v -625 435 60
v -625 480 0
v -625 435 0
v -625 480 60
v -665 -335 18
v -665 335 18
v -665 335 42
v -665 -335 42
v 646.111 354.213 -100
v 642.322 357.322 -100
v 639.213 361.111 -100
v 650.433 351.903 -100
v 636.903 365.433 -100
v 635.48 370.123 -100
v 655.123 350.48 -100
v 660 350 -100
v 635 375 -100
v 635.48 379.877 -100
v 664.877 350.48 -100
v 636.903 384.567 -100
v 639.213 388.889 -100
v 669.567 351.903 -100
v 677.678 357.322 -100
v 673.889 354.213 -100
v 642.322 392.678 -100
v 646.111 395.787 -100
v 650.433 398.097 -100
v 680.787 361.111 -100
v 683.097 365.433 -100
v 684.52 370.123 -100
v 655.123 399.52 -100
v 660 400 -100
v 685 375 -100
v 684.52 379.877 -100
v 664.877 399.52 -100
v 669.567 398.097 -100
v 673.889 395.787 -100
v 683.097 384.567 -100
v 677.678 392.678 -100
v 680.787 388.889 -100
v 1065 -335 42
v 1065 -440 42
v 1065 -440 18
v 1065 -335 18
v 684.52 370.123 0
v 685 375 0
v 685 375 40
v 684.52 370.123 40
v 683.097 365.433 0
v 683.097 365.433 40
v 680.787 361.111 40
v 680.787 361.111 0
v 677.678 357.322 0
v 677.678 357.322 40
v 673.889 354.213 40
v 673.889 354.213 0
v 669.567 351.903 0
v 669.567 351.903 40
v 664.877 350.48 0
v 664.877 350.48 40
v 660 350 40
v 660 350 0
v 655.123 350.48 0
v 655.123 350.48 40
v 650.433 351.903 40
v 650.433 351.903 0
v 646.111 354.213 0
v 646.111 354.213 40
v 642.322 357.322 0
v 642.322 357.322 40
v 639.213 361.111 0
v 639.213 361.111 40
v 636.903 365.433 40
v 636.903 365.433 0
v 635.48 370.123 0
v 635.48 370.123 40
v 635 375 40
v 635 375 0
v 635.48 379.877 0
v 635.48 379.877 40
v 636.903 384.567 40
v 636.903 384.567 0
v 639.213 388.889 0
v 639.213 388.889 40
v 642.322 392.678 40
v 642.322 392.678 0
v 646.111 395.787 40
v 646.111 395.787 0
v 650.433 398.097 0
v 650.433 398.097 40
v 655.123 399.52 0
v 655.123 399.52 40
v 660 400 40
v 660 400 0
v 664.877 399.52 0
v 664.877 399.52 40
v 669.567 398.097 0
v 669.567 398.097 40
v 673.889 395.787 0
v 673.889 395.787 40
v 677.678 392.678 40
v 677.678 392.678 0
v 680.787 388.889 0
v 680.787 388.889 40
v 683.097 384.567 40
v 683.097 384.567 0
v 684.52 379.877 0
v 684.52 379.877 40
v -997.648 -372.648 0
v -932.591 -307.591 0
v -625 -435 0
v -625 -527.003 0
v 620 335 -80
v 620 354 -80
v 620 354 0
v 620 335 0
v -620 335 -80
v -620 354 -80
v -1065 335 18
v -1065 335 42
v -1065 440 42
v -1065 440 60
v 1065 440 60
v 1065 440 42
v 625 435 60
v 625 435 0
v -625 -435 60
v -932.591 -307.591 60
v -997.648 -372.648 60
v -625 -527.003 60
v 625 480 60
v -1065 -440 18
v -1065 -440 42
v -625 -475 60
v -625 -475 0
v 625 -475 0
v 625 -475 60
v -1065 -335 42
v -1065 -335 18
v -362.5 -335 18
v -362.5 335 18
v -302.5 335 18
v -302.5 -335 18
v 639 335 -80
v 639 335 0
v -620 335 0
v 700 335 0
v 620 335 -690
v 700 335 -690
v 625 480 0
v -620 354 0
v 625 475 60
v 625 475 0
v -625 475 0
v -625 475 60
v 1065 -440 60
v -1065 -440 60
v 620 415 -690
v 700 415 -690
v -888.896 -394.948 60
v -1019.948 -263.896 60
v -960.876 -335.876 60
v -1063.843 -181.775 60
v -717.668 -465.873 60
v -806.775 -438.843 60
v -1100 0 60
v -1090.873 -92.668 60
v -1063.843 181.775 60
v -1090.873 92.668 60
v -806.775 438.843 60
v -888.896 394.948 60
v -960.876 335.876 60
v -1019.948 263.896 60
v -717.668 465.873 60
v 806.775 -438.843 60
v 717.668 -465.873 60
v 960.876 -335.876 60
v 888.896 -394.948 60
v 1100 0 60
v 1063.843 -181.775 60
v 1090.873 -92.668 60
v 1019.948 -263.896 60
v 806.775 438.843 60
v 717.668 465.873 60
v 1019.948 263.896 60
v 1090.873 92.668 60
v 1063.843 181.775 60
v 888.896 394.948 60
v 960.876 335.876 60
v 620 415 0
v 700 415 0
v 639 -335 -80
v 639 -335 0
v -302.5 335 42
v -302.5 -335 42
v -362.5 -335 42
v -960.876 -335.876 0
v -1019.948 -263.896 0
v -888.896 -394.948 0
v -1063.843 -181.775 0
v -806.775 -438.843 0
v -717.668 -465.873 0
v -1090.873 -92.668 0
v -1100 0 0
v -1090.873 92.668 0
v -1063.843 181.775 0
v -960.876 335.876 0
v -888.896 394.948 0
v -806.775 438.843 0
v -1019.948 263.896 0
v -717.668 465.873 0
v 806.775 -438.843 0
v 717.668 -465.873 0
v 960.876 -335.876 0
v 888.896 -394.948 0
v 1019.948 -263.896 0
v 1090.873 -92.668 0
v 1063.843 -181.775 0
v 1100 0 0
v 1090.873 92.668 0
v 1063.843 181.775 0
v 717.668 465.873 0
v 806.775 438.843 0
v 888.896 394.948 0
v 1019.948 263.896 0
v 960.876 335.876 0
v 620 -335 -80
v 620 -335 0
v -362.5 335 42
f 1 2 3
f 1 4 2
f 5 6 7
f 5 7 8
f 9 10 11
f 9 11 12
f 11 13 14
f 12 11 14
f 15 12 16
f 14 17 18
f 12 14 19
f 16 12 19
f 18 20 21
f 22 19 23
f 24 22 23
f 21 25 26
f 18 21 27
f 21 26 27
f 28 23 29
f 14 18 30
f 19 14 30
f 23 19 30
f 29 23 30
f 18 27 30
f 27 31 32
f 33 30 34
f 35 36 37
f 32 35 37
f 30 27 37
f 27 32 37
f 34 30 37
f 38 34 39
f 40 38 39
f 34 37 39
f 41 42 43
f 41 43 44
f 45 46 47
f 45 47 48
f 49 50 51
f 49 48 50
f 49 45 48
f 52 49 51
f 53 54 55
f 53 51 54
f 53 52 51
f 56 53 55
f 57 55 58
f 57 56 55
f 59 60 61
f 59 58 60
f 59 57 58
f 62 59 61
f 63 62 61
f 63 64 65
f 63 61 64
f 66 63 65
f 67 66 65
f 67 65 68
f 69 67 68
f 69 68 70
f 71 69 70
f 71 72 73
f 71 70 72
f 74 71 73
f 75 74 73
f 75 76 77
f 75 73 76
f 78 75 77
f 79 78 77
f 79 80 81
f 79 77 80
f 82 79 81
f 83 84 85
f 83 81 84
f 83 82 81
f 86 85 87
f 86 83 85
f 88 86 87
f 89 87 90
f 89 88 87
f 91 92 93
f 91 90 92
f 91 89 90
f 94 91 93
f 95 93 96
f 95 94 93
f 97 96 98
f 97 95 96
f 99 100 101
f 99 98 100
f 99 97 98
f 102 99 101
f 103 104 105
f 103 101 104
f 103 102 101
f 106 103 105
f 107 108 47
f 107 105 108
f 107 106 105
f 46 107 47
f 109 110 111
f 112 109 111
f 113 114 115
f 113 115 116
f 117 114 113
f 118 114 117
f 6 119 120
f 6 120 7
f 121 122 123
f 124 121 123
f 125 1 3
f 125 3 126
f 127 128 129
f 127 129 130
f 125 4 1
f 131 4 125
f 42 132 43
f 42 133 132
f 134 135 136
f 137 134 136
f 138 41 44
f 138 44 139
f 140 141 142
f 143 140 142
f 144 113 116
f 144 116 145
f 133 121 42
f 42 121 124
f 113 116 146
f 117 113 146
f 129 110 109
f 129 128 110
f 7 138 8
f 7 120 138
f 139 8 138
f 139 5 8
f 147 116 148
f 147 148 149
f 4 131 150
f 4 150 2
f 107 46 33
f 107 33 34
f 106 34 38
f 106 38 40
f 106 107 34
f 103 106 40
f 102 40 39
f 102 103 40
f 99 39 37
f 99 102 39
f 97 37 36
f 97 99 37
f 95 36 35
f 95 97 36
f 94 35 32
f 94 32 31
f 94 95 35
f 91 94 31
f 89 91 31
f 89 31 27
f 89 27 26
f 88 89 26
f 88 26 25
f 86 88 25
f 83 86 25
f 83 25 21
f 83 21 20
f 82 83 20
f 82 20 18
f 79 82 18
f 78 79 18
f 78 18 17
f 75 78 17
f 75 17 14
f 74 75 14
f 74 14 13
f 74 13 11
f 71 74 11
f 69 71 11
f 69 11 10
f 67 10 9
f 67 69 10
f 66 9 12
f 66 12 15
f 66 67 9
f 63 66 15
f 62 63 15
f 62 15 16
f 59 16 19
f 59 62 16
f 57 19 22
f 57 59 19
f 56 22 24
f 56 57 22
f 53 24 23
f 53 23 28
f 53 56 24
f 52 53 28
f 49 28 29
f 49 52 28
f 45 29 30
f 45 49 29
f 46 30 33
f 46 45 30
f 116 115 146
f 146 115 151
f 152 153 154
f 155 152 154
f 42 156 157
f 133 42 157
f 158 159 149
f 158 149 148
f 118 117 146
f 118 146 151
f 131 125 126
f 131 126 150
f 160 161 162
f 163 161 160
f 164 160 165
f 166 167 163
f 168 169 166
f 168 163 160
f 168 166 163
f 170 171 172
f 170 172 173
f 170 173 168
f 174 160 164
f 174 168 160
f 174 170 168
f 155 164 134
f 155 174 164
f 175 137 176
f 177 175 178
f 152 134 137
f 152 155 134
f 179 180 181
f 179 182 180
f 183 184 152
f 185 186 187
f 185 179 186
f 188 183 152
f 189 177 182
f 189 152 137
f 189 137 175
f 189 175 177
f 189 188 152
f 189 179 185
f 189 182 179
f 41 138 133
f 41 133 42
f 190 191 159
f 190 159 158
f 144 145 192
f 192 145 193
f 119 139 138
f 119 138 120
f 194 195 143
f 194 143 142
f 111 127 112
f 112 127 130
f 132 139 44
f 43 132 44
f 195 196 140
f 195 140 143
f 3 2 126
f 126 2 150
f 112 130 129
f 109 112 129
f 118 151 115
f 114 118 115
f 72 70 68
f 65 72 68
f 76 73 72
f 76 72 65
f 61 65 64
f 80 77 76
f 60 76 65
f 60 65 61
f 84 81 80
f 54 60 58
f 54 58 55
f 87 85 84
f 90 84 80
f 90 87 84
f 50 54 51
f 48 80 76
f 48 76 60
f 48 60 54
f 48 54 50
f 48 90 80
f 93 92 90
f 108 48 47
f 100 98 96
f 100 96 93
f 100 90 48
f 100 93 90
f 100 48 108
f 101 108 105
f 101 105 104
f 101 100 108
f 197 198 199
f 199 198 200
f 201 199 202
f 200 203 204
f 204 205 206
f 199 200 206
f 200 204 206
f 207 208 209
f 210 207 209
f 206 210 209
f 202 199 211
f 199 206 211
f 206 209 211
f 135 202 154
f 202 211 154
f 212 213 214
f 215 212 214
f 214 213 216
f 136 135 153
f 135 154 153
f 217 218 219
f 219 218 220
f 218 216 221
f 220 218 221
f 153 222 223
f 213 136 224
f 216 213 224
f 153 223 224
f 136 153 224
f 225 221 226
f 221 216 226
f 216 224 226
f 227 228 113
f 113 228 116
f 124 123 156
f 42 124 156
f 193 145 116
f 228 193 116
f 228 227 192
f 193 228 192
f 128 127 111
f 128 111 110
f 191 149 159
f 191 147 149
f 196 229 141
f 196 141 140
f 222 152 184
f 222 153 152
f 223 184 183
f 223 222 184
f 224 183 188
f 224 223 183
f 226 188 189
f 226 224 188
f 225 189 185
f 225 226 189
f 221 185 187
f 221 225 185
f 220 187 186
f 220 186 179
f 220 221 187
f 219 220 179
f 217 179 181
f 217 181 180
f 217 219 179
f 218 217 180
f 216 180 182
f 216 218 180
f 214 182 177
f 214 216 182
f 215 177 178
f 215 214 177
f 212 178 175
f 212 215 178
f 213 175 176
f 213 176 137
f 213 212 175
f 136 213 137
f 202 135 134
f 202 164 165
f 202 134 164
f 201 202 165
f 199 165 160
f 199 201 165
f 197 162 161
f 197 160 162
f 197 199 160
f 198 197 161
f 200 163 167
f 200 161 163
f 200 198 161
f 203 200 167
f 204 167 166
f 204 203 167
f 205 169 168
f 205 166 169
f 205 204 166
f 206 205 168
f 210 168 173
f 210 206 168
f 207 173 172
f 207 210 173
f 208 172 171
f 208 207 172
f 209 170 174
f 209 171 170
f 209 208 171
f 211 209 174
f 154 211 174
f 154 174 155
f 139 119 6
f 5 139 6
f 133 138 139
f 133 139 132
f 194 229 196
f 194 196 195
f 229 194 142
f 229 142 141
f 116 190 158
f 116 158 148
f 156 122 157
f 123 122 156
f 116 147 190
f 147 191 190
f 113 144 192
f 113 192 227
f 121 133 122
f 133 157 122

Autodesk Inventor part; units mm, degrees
ref_plane "YZ Plane" through (0, 0, 0) normal (1, 0, 0) x (0, 1, 0)
ref_plane "XZ Plane" through (0, 0, 0) normal (0, 1, 0) x (-1, 0, 0)
ref_plane "XY Plane" through (0, 0, 0) normal (0, 0, 1) x (1, 0, 0)
sketch "Sketch33" plane through (0, 0, 0) normal (0, 0, 1) x (1, 0, 0)
  line L0 (625, 475) -> (-625, 475)
  line L1 (-625, 475) -> (-625, -475)
  line L2 (-625, -475) -> (625, -475)
  line L3 (625, -475) -> (625, 475)
  circle A0 centre (-625, 0) radius 475
  circle A1 centre (625, 0) radius 475
  line L4 (-1100, 475) -> (1100, 475) construction
  line L5 (1100, 475) -> (1100, -475) construction
  line L6 (1100, -475) -> (-1100, -475) construction
  line L7 (-1100, -475) -> (-1100, 475) construction
  point P0 (0, 0)
  point P1 (0, 475)
  dimension "d88" = 2200
  dimension "d89" = 950
extrude "Extrusion8" add sketch "Sketch33" along normal blind 60
ref_plane "Inner Layer Top" through (0, 0, 42) normal (0, 0, 1) x (1, 0, 0)
ref_plane "Inner Layer Bottom" through (0, 0, 18) normal (0, 0, -1) x (-1, 0, 0)
sketch "Side Inserts" plane through (0, 0, 60) normal (0, 0, 1) x (1, 0, 0)
  arc A0 (625, -475) -> (625, 475) centre (625, 0) ccw projected
  line L0 (-625, 475) -> (625, 475) projected
  arc A1 (-625, 475) -> (-625, -475) centre (-625, 0) ccw projected
  line L1 (625, -475) -> (-625, -475) projected
  arc A2 (-625, 435) -> (-625, -435) centre (-625, 0) ccw
  line L2 (-625, 435) -> (625, 435)
  arc A3 (625, -435) -> (625, 435) centre (625, 0) ccw
  line L3 (625, -435) -> (-625, -435)
  line L4 (-1065, 440) -> (1065, 440)
  line L5 (1065, 440) -> (1065, 335)
  line L6 (1065, 335) -> (-1065, 335)
  line L7 (-1065, 335) -> (-1065, 440)
  line L8 (-1060, 503.9834) -> (-1060, -438.8522) construction
  line L9 (-1612.8047, 0) -> (1612.8047, 0) projected
  line L10 (-625, -435) -> (625, -435)
  line L11 (-1065, -440) -> (1065, -440)
  line L12 (1065, -440) -> (1065, -335)
  line L13 (1065, -335) -> (-1065, -335)
  line L14 (-1065, -335) -> (-1065, -440)
  point P0 (0, 0)
  point P1 (0, 335)
  point P2 (0, -335)
  dimension "d94" = 40
  dimension "d95" = 5
  dimension "d96" = 100
  dimension "d97" = 5
extrude "Extrusion9" add sketch "Side Inserts" against normal up to surface (24 mm away) from surface at -18 separate body contours L11 A1 L13 A2 L3 A3 A0 | A0 L13 L12 L11 | L11 L14 L13 A1 | A3 L3 A2 L13
sketch "Top&Bottom Plate" plane through (0, 0, 60) normal (0, 0, 1) x (1, 0, 0)
  arc A0 (-625, 475) -> (-625, -475) centre (-625, 0) ccw projected
  line L0 (-1065, 440) -> (1065, 440)
  line L1 (1065, 440) -> (1065, -440)
  line L2 (1065, -440) -> (-1065, -440)
  line L3 (-1065, -440) -> (-1065, 440)
  point P0 (0, 0)
  point P1 (0, -440)
  point P2 (-1100, 0)
  point P3 (-1065, 0)
extrude "Extrusion10" add sketch "Top&Bottom Plate" against normal up to surface (18 mm away) separate body contours L0 L1 L2 A0 L3 | A0 L3 L0 | A0 L2 L3
sketch "Timber Frame" plane through (0, 0, 60) normal (0, 0, 1) x (1, 0, 0)
  arc A0 (625, -475) -> (625, 475) centre (625, 0) ccw construction
  line L0 (-625, 475) -> (625, 475) construction
  arc A1 (-625, 475) -> (-625, -475) centre (-625, 0) ccw construction
  line L1 (625, -475) -> (-625, -475) construction
  arc A2 (-625, 435) -> (-625, -435) centre (-625, 0) ccw construction
  line L2 (-625, 435) -> (625, 435)
  arc A3 (625, -435) -> (625, 435) centre (625, 0) ccw construction
  line L3 (625, -435) -> (-625, -435)
  line L4 (-625, -435) -> (-932.5914, -307.5914)
  line L5 (-932.5914, -307.5914) -> (-1060, 0)
  line L6 (-1060, 0) -> (-932.5914, 307.5914)
  line L7 (-932.5914, 307.5914) -> (-625, 435)
  line L8 (-625, -527.0033) -> (-997.6476, -372.6476)
  line L9 (-997.6476, -372.6476) -> (-1152.0033, 0)
  line L10 (-1152.0033, 0) -> (-997.6476, 372.6476)
  line L11 (-997.6476, 372.6476) -> (-625, 527.0033)
  line L12 (-625, 435) -> (-625, 527.0033)
  line L13 (-625, -435) -> (-625, -527.0033)
  line L14 (-932.5914, 307.5914) -> (-997.6476, 372.6476)
  line L15 (-1060, 0) -> (-1152.0033, 0)
  line L16 (-932.5914, -307.5914) -> (-997.6476, -372.6476)
  line L17 (0, -737.8047) -> (0, 737.8047) projected
  line L18 (625, -435) -> (932.5914, -307.5914)
  line L19 (932.5914, -307.5914) -> (1060, 0)
  line L20 (1060, 0) -> (932.5914, 307.5914)
  line L21 (932.5914, 307.5914) -> (625, 435)
  line L22 (625, -527.0033) -> (997.6476, -372.6476)
  line L23 (997.6476, -372.6476) -> (1152.0033, 0)
  line L24 (1152.0033, 0) -> (997.6476, 372.6476)
  line L25 (997.6476, 372.6476) -> (625, 527.0033)
  line L26 (625, 435) -> (625, 527.0033)
  line L27 (625, -435) -> (625, -527.0033)
  line L28 (932.5914, 307.5914) -> (997.6476, 372.6476)
  line L29 (1060, 0) -> (1152.0033, 0)
  line L30 (932.5914, -307.5914) -> (997.6476, -372.6476)
  line L31 (-625, 435) -> (625, 435) construction
  line L32 (-625, -435) -> (625, -435) construction
  point P0 (0, 0)
  dimension "d98" = 40
  dimension "d99" = 85
extrude "Extrusion11" add sketch "Timber Frame" against normal up to surface (60 mm away) separate body contours L13 L8 L16 L4
sketch "Inner Inserts" plane through (0, 0, 60) normal (0, 0, 1) x (1, 0, 0)
  line L0 (-1065, -440) -> (-1065, 440) projected
  line L1 (1065, 335) -> (-1065, 335) construction
  line L2 (1065, 440) -> (1065, -440) projected
  line L3 (1065, -335) -> (-1065, -335) construction
  line L4 (-1065, 335) -> (-665, 335)
  line L5 (-665, 335) -> (-665, -335)
  line L6 (-665, -335) -> (-1065, -335)
  line L7 (-1065, -335) -> (-1065, 335)
  line L8 (-302.5, 335) -> (-362.5, 335)
  line L9 (-362.5, 335) -> (-362.5, -335)
  line L10 (-362.5, -335) -> (-302.5, -335)
  line L11 (-302.5, -335) -> (-302.5, 335)
  line L12 (1065, 335) -> (665, 335) construction
  line L13 (665, 335) -> (665, -335) construction
  line L14 (665, -335) -> (1065, -335) construction
  line L15 (1065, -335) -> (1065, 335) construction
  line L16 (-332.5, 335) -> (-332.5, -335) construction
  line L17 (30, -335) -> (30, 335)
  line L18 (0, 335) -> (0, -335) construction
  line L19 (-30, -335) -> (30, -335)
  line L20 (30, 335) -> (-30, 335)
  line L21 (-30, 335) -> (-30, -335)
  line L22 (362.5, -335) -> (362.5, 335)
  line L23 (332.5, 335) -> (332.5, -335) construction
  line L24 (302.5, -335) -> (362.5, -335)
  line L25 (362.5, 335) -> (302.5, 335)
  line L26 (302.5, 335) -> (302.5, -335)
  point P0 (0, 0)
  dimension "InsertN" = 3
  dimension "d100" = 400
  dimension "d101" = 60
  dimension "IsertsSpace" = 1330
  dimension "BetweenInserts" = 332.5
  dimension "d124" = 332.5
extrude "Extrusion12" add sketch "Inner Inserts" along normal up to surface (24 mm away) from surface at -42 separate body contours L0 L4 L5 L6
extrude "Extrusion13" add sketch "Inner Inserts" against normal up to surface (24 mm away) from surface at -18 separate body contours L11 L10 L9 L8
ref_plane "Bottom Plane" through (0, 0, 0) normal (0, 0, -1) x (-1, 0, 0)
sketch "Insert Along Edge" plane through (0, 0, 60) normal (0, 0, 1) x (1, 0, 0)
  line L0 (-625, 475) -> (625, 475) projected
  line L1 (-625, 435) -> (-625, 527.0033) construction
  line L2 (625, 435) -> (625, 527.0033) construction
  line L3 (-625, 435) -> (625, 435)
  line L4 (625, 435) -> (625, 480)
  line L5 (625, 480) -> (-625, 480)
  line L6 (-625, 480) -> (-625, 435)
  point P0 (0, 0)
  dimension "d104" = 5
extrude "Extrusion14" add sketch "Insert Along Edge" against normal up to surface (60 mm away) separate body
sketch "Outside Contour of table" plane through (0, 0, 60) normal (0, 0, 1) x (1, 0, 0)
  arc A0 (625, -475) -> (625, 475) centre (625, 0) ccw projected
  line L0 (-625, 475) -> (625, 475) projected
  arc A1 (-625, 475) -> (-625, -475) centre (-625, 0) ccw projected
  line L1 (625, -475) -> (-625, -475) projected
  point P0 (0, 0)
sketch "Legs position" plane through (0, 0, 0) normal (0, 0, -1) x (-1, 0, 0)
  line L0 (-625, 475) -> (625, 475) projected
  line L1 (-620, 335) -> (620, 335)
  line L2 (620, 335) -> (620, -335)
  line L3 (620, -335) -> (-620, -335)
  line L4 (-620, -335) -> (-620, 335)
  line L5 (639, 354) -> (-639, 354)
  line L6 (-639, 354) -> (-639, -354)
  line L7 (-639, -354) -> (639, -354)
  line L8 (639, -354) -> (639, 354)
  line L9 (-620, 335) -> (-700, 335)
  line L10 (-700, 335) -> (-700, 415)
  line L11 (-700, 415) -> (-620, 415)
  line L12 (-620, 415) -> (-620, 335)
  line L13 (-620, -335) -> (-639, -335)
  line L14 (620, 335) -> (620, 354)
  line L15 (-620, 335) -> (-639, 335)
  line L16 (-620, 335) -> (-620, 354)
  point P0 (0, 0)
  point P1 (-620, 0)
  point P2 (0, 335)
  dimension "d105" = 19
  dimension "d106" = 80
  dimension "d107" = 60
  dimension "d108" = 700
ref_plane "Bottom of leg" through (0, 0, -690) normal (0, 0, -1) x (-1, 0, 0)
extrude "Extrusion15" add sketch "Legs position" along normal up to surface (690 mm away) separate body contours L9 L6 L5 L12 | L9 L10 L11 L12 L5 L6
sketch "Sketch41" plane through (0, 0, 0) normal (0, 0, 1) x (1, 0, 0)
  circle A0 centre (660, 375) radius 25
  line L0 (620, 415) -> (620, 335) projected
  line L1 (700, 415) -> (620, 415) projected
  point P0 (0, 0)
  point P1 (620, 375)
  point P2 (660, 415)
  dimension "d133" = 50
extrude "Extrusion16" add sketch "Sketch41" along normal blind 40 and the other way blind 100 separate body
extrude "Extrusion17" add sketch "Legs position" along normal blind 80 separate body contours L4 L13 L6 L9
extrude "Extrusion18" add sketch "Legs position" along normal up to surface (80 mm away) separate body contours L12 L5 L14 L1
equation "\"InsertN\" = 3"
equation "\"d124\" = BetweenInserts"
properties part number "Coposite Top Table Skeleton"
